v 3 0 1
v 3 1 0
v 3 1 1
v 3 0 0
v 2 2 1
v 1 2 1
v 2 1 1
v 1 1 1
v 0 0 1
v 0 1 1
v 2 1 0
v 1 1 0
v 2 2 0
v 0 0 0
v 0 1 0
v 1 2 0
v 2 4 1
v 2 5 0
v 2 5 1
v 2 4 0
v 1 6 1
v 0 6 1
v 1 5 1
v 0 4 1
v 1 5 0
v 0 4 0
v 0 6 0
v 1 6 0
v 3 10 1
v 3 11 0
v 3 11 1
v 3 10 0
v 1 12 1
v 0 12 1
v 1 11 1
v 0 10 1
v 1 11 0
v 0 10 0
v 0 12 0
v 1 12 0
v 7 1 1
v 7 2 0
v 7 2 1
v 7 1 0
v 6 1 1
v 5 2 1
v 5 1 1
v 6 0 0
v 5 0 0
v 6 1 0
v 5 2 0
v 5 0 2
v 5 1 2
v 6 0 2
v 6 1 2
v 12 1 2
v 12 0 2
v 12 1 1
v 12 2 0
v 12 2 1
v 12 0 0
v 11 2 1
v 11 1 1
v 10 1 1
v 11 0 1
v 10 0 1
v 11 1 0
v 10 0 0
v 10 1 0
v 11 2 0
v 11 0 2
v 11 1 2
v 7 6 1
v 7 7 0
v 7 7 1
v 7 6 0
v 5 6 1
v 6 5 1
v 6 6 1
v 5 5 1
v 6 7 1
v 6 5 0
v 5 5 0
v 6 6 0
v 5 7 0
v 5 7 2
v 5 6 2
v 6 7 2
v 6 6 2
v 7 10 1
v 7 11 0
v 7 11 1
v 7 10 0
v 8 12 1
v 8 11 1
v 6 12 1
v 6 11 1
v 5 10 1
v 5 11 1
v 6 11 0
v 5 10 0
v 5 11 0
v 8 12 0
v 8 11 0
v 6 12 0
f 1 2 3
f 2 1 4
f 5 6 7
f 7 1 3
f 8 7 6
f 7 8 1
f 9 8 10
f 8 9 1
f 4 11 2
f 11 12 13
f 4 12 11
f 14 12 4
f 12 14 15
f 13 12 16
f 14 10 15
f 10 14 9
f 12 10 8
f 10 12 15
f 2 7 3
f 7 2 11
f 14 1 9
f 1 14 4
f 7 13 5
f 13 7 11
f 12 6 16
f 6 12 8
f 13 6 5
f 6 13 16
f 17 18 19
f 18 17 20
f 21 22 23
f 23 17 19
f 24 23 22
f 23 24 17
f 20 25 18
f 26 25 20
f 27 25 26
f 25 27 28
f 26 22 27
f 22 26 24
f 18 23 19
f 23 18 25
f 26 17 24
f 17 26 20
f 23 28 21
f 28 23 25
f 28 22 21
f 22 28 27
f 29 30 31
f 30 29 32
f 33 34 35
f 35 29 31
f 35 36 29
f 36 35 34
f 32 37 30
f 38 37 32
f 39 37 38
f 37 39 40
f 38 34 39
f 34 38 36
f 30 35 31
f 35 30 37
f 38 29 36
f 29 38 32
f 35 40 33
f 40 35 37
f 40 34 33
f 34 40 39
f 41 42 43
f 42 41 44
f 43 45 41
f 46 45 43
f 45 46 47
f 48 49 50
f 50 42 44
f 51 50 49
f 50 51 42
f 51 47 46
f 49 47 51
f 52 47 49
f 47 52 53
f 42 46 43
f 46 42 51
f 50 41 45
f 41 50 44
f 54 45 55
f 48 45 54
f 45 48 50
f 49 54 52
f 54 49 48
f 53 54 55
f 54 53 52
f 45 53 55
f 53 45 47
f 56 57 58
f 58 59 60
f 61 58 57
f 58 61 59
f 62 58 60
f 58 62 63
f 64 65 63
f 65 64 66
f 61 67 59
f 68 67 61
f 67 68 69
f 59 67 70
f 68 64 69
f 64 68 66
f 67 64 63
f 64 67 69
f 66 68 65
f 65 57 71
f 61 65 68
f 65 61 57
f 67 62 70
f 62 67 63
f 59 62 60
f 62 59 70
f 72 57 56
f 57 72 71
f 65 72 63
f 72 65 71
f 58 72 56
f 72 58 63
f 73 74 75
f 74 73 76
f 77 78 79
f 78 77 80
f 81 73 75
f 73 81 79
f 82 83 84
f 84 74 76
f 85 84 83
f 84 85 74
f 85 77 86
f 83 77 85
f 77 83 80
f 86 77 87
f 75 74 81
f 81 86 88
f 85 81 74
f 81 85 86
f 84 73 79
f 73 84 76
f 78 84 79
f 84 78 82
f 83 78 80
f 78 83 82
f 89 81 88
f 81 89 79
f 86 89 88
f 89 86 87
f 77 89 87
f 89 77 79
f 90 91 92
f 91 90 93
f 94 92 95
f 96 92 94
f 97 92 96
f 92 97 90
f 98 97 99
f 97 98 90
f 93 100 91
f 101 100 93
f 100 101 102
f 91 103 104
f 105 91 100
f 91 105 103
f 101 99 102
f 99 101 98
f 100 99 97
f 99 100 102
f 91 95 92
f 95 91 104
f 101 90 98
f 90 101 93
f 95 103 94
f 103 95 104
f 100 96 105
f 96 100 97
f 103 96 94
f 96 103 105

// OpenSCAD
cube([3,1,1]);
translate([1,1,0])
    cube(1,1,1);
translate([0,4,0])
    cube([2,1,1]);
translate([0,5,0])
    cube([1,1,1]);
translate([0,10,0])
    cube([3,1,1]);
translate([0,11,0])
    cube([1,1,1]);
translate([5,1,0])
    cube([2,1,1]);
translate([5,0,0])
    cube([1,1,1]);
translate([5,0,1])
    cube([1,1,1]);
translate([10,0,0])
    cube([2,1,1]);
translate([11,1,0])
    cube([1,1,1]);
translate([11,0,1])
    cube([1,1,1]);
translate([5,6,0])
    cube([2,1,1]);
translate([5,5,0])
    cube([1,1,1]);
translate([5,6,1])
    cube([1,1,1]);
translate([5,10,0])
    cube([2,1,1]);
translate([6,11,0])
    cube([2,1,1]);
